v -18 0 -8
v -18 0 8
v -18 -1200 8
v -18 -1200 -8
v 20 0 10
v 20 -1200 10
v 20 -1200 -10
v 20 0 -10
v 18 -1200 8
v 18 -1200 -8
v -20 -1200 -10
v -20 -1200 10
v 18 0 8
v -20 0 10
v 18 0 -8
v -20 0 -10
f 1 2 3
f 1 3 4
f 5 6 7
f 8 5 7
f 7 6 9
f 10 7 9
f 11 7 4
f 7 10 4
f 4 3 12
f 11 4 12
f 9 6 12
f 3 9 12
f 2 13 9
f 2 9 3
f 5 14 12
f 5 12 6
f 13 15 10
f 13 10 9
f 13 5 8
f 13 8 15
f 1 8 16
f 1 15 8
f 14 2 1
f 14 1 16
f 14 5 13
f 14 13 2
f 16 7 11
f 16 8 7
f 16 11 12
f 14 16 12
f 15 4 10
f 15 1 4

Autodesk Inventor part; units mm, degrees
ref_plane "YZ Plane" through (0, 0, 0) normal (1, 0, 0) x (0, 1, 0)
ref_plane "XZ Plane" through (0, 0, 0) normal (0, 1, 0) x (-1, 0, 0)
ref_plane "XY Plane" through (0, 0, 0) normal (0, 0, 1) x (1, 0, 0)
sketch "Sketch9" plane through (0, 0, 0) normal (0, 1, 0) x (-1, 0, 0)
  line L0 (20, 10) -> (-20, 10)
  line L1 (-20, 10) -> (-20, -10)
  line L2 (-20, -10) -> (20, -10)
  line L3 (20, -10) -> (20, 10)
  line L4 (20, 10) -> (-20, -10) construction
  line L5 (-20, 10) -> (20, -10) construction
  line L6 (-18, 8) -> (18, 8)
  line L7 (18, 8) -> (18, -8)
  line L8 (18, -8) -> (-18, -8)
  line L9 (-18, -8) -> (-18, 8)
  point P0 (0, 0)
  dimension "d172" = 40
  dimension "d173" = 20
  dimension "d174" = 2
extrude "Extrusion3" add sketch "Sketch9" against normal blind 1200
sketch "Sketch10" plane through (0, 0, 0) normal (1, 0, 0) x (0, 1, 0)
  line L0 (0, 10) -> (0, -10) construction
  line L1 (0, 10) -> (-1200, 10) construction
  line L2 (-1200, -10) -> (-1200, 10) construction
  line L3 (0, -10) -> (-1200, -10) construction
  line L4 (-148.5, 8.5) -> (-131.5, 8.5)
  line L5 (-131.5, 8.5) -> (-131.5, -8.5)
  line L6 (-131.5, -8.5) -> (-148.5, -8.5)
  line L7 (-148.5, -8.5) -> (-148.5, 8.5)
  line L8 (-148.5, 8.5) -> (-131.5, -8.5) construction
  line L9 (-131.5, 8.5) -> (-148.5, -8.5) construction
  line L10 (-308.5, 8.5) -> (-291.5, 8.5)
  line L11 (-291.5, 8.5) -> (-291.5, -8.5)
  line L12 (-291.5, -8.5) -> (-308.5, -8.5)
  line L13 (-308.5, -8.5) -> (-308.5, 8.5)
  line L14 (-308.5, 8.5) -> (-291.5, -8.5) construction
  line L15 (-291.5, 8.5) -> (-308.5, -8.5) construction
  line L16 (-428.5, 8.5) -> (-411.5, 8.5)
  line L17 (-411.5, 8.5) -> (-411.5, -8.5)
  line L18 (-411.5, -8.5) -> (-428.5, -8.5)
  line L19 (-428.5, -8.5) -> (-428.5, 8.5)
  line L20 (-428.5, 8.5) -> (-411.5, -8.5) construction
  line L21 (-411.5, 8.5) -> (-428.5, -8.5) construction
  circle A0 centre (-470, 0) radius 8.5
  line L22 (0, 0) -> (30, 0)
  circle A1 centre (-140, 0) radius 8.5
  circle A2 centre (-300, 0) radius 8.5
  circle A3 centre (-420, 0) radius 8.5
  dimension "d177" = 17
  dimension "d178" = 17
  dimension "d181" = 30
  dimension "d182" = 170
  dimension "d183" = 330
  dimension "d184" = 450
  dimension "d185" = 500
  dimension "d186" = 17
extrude "Extrusion4" [suppressed]
properties part number "TKS 3562 FDS support tube" material "Stainless Steel"
